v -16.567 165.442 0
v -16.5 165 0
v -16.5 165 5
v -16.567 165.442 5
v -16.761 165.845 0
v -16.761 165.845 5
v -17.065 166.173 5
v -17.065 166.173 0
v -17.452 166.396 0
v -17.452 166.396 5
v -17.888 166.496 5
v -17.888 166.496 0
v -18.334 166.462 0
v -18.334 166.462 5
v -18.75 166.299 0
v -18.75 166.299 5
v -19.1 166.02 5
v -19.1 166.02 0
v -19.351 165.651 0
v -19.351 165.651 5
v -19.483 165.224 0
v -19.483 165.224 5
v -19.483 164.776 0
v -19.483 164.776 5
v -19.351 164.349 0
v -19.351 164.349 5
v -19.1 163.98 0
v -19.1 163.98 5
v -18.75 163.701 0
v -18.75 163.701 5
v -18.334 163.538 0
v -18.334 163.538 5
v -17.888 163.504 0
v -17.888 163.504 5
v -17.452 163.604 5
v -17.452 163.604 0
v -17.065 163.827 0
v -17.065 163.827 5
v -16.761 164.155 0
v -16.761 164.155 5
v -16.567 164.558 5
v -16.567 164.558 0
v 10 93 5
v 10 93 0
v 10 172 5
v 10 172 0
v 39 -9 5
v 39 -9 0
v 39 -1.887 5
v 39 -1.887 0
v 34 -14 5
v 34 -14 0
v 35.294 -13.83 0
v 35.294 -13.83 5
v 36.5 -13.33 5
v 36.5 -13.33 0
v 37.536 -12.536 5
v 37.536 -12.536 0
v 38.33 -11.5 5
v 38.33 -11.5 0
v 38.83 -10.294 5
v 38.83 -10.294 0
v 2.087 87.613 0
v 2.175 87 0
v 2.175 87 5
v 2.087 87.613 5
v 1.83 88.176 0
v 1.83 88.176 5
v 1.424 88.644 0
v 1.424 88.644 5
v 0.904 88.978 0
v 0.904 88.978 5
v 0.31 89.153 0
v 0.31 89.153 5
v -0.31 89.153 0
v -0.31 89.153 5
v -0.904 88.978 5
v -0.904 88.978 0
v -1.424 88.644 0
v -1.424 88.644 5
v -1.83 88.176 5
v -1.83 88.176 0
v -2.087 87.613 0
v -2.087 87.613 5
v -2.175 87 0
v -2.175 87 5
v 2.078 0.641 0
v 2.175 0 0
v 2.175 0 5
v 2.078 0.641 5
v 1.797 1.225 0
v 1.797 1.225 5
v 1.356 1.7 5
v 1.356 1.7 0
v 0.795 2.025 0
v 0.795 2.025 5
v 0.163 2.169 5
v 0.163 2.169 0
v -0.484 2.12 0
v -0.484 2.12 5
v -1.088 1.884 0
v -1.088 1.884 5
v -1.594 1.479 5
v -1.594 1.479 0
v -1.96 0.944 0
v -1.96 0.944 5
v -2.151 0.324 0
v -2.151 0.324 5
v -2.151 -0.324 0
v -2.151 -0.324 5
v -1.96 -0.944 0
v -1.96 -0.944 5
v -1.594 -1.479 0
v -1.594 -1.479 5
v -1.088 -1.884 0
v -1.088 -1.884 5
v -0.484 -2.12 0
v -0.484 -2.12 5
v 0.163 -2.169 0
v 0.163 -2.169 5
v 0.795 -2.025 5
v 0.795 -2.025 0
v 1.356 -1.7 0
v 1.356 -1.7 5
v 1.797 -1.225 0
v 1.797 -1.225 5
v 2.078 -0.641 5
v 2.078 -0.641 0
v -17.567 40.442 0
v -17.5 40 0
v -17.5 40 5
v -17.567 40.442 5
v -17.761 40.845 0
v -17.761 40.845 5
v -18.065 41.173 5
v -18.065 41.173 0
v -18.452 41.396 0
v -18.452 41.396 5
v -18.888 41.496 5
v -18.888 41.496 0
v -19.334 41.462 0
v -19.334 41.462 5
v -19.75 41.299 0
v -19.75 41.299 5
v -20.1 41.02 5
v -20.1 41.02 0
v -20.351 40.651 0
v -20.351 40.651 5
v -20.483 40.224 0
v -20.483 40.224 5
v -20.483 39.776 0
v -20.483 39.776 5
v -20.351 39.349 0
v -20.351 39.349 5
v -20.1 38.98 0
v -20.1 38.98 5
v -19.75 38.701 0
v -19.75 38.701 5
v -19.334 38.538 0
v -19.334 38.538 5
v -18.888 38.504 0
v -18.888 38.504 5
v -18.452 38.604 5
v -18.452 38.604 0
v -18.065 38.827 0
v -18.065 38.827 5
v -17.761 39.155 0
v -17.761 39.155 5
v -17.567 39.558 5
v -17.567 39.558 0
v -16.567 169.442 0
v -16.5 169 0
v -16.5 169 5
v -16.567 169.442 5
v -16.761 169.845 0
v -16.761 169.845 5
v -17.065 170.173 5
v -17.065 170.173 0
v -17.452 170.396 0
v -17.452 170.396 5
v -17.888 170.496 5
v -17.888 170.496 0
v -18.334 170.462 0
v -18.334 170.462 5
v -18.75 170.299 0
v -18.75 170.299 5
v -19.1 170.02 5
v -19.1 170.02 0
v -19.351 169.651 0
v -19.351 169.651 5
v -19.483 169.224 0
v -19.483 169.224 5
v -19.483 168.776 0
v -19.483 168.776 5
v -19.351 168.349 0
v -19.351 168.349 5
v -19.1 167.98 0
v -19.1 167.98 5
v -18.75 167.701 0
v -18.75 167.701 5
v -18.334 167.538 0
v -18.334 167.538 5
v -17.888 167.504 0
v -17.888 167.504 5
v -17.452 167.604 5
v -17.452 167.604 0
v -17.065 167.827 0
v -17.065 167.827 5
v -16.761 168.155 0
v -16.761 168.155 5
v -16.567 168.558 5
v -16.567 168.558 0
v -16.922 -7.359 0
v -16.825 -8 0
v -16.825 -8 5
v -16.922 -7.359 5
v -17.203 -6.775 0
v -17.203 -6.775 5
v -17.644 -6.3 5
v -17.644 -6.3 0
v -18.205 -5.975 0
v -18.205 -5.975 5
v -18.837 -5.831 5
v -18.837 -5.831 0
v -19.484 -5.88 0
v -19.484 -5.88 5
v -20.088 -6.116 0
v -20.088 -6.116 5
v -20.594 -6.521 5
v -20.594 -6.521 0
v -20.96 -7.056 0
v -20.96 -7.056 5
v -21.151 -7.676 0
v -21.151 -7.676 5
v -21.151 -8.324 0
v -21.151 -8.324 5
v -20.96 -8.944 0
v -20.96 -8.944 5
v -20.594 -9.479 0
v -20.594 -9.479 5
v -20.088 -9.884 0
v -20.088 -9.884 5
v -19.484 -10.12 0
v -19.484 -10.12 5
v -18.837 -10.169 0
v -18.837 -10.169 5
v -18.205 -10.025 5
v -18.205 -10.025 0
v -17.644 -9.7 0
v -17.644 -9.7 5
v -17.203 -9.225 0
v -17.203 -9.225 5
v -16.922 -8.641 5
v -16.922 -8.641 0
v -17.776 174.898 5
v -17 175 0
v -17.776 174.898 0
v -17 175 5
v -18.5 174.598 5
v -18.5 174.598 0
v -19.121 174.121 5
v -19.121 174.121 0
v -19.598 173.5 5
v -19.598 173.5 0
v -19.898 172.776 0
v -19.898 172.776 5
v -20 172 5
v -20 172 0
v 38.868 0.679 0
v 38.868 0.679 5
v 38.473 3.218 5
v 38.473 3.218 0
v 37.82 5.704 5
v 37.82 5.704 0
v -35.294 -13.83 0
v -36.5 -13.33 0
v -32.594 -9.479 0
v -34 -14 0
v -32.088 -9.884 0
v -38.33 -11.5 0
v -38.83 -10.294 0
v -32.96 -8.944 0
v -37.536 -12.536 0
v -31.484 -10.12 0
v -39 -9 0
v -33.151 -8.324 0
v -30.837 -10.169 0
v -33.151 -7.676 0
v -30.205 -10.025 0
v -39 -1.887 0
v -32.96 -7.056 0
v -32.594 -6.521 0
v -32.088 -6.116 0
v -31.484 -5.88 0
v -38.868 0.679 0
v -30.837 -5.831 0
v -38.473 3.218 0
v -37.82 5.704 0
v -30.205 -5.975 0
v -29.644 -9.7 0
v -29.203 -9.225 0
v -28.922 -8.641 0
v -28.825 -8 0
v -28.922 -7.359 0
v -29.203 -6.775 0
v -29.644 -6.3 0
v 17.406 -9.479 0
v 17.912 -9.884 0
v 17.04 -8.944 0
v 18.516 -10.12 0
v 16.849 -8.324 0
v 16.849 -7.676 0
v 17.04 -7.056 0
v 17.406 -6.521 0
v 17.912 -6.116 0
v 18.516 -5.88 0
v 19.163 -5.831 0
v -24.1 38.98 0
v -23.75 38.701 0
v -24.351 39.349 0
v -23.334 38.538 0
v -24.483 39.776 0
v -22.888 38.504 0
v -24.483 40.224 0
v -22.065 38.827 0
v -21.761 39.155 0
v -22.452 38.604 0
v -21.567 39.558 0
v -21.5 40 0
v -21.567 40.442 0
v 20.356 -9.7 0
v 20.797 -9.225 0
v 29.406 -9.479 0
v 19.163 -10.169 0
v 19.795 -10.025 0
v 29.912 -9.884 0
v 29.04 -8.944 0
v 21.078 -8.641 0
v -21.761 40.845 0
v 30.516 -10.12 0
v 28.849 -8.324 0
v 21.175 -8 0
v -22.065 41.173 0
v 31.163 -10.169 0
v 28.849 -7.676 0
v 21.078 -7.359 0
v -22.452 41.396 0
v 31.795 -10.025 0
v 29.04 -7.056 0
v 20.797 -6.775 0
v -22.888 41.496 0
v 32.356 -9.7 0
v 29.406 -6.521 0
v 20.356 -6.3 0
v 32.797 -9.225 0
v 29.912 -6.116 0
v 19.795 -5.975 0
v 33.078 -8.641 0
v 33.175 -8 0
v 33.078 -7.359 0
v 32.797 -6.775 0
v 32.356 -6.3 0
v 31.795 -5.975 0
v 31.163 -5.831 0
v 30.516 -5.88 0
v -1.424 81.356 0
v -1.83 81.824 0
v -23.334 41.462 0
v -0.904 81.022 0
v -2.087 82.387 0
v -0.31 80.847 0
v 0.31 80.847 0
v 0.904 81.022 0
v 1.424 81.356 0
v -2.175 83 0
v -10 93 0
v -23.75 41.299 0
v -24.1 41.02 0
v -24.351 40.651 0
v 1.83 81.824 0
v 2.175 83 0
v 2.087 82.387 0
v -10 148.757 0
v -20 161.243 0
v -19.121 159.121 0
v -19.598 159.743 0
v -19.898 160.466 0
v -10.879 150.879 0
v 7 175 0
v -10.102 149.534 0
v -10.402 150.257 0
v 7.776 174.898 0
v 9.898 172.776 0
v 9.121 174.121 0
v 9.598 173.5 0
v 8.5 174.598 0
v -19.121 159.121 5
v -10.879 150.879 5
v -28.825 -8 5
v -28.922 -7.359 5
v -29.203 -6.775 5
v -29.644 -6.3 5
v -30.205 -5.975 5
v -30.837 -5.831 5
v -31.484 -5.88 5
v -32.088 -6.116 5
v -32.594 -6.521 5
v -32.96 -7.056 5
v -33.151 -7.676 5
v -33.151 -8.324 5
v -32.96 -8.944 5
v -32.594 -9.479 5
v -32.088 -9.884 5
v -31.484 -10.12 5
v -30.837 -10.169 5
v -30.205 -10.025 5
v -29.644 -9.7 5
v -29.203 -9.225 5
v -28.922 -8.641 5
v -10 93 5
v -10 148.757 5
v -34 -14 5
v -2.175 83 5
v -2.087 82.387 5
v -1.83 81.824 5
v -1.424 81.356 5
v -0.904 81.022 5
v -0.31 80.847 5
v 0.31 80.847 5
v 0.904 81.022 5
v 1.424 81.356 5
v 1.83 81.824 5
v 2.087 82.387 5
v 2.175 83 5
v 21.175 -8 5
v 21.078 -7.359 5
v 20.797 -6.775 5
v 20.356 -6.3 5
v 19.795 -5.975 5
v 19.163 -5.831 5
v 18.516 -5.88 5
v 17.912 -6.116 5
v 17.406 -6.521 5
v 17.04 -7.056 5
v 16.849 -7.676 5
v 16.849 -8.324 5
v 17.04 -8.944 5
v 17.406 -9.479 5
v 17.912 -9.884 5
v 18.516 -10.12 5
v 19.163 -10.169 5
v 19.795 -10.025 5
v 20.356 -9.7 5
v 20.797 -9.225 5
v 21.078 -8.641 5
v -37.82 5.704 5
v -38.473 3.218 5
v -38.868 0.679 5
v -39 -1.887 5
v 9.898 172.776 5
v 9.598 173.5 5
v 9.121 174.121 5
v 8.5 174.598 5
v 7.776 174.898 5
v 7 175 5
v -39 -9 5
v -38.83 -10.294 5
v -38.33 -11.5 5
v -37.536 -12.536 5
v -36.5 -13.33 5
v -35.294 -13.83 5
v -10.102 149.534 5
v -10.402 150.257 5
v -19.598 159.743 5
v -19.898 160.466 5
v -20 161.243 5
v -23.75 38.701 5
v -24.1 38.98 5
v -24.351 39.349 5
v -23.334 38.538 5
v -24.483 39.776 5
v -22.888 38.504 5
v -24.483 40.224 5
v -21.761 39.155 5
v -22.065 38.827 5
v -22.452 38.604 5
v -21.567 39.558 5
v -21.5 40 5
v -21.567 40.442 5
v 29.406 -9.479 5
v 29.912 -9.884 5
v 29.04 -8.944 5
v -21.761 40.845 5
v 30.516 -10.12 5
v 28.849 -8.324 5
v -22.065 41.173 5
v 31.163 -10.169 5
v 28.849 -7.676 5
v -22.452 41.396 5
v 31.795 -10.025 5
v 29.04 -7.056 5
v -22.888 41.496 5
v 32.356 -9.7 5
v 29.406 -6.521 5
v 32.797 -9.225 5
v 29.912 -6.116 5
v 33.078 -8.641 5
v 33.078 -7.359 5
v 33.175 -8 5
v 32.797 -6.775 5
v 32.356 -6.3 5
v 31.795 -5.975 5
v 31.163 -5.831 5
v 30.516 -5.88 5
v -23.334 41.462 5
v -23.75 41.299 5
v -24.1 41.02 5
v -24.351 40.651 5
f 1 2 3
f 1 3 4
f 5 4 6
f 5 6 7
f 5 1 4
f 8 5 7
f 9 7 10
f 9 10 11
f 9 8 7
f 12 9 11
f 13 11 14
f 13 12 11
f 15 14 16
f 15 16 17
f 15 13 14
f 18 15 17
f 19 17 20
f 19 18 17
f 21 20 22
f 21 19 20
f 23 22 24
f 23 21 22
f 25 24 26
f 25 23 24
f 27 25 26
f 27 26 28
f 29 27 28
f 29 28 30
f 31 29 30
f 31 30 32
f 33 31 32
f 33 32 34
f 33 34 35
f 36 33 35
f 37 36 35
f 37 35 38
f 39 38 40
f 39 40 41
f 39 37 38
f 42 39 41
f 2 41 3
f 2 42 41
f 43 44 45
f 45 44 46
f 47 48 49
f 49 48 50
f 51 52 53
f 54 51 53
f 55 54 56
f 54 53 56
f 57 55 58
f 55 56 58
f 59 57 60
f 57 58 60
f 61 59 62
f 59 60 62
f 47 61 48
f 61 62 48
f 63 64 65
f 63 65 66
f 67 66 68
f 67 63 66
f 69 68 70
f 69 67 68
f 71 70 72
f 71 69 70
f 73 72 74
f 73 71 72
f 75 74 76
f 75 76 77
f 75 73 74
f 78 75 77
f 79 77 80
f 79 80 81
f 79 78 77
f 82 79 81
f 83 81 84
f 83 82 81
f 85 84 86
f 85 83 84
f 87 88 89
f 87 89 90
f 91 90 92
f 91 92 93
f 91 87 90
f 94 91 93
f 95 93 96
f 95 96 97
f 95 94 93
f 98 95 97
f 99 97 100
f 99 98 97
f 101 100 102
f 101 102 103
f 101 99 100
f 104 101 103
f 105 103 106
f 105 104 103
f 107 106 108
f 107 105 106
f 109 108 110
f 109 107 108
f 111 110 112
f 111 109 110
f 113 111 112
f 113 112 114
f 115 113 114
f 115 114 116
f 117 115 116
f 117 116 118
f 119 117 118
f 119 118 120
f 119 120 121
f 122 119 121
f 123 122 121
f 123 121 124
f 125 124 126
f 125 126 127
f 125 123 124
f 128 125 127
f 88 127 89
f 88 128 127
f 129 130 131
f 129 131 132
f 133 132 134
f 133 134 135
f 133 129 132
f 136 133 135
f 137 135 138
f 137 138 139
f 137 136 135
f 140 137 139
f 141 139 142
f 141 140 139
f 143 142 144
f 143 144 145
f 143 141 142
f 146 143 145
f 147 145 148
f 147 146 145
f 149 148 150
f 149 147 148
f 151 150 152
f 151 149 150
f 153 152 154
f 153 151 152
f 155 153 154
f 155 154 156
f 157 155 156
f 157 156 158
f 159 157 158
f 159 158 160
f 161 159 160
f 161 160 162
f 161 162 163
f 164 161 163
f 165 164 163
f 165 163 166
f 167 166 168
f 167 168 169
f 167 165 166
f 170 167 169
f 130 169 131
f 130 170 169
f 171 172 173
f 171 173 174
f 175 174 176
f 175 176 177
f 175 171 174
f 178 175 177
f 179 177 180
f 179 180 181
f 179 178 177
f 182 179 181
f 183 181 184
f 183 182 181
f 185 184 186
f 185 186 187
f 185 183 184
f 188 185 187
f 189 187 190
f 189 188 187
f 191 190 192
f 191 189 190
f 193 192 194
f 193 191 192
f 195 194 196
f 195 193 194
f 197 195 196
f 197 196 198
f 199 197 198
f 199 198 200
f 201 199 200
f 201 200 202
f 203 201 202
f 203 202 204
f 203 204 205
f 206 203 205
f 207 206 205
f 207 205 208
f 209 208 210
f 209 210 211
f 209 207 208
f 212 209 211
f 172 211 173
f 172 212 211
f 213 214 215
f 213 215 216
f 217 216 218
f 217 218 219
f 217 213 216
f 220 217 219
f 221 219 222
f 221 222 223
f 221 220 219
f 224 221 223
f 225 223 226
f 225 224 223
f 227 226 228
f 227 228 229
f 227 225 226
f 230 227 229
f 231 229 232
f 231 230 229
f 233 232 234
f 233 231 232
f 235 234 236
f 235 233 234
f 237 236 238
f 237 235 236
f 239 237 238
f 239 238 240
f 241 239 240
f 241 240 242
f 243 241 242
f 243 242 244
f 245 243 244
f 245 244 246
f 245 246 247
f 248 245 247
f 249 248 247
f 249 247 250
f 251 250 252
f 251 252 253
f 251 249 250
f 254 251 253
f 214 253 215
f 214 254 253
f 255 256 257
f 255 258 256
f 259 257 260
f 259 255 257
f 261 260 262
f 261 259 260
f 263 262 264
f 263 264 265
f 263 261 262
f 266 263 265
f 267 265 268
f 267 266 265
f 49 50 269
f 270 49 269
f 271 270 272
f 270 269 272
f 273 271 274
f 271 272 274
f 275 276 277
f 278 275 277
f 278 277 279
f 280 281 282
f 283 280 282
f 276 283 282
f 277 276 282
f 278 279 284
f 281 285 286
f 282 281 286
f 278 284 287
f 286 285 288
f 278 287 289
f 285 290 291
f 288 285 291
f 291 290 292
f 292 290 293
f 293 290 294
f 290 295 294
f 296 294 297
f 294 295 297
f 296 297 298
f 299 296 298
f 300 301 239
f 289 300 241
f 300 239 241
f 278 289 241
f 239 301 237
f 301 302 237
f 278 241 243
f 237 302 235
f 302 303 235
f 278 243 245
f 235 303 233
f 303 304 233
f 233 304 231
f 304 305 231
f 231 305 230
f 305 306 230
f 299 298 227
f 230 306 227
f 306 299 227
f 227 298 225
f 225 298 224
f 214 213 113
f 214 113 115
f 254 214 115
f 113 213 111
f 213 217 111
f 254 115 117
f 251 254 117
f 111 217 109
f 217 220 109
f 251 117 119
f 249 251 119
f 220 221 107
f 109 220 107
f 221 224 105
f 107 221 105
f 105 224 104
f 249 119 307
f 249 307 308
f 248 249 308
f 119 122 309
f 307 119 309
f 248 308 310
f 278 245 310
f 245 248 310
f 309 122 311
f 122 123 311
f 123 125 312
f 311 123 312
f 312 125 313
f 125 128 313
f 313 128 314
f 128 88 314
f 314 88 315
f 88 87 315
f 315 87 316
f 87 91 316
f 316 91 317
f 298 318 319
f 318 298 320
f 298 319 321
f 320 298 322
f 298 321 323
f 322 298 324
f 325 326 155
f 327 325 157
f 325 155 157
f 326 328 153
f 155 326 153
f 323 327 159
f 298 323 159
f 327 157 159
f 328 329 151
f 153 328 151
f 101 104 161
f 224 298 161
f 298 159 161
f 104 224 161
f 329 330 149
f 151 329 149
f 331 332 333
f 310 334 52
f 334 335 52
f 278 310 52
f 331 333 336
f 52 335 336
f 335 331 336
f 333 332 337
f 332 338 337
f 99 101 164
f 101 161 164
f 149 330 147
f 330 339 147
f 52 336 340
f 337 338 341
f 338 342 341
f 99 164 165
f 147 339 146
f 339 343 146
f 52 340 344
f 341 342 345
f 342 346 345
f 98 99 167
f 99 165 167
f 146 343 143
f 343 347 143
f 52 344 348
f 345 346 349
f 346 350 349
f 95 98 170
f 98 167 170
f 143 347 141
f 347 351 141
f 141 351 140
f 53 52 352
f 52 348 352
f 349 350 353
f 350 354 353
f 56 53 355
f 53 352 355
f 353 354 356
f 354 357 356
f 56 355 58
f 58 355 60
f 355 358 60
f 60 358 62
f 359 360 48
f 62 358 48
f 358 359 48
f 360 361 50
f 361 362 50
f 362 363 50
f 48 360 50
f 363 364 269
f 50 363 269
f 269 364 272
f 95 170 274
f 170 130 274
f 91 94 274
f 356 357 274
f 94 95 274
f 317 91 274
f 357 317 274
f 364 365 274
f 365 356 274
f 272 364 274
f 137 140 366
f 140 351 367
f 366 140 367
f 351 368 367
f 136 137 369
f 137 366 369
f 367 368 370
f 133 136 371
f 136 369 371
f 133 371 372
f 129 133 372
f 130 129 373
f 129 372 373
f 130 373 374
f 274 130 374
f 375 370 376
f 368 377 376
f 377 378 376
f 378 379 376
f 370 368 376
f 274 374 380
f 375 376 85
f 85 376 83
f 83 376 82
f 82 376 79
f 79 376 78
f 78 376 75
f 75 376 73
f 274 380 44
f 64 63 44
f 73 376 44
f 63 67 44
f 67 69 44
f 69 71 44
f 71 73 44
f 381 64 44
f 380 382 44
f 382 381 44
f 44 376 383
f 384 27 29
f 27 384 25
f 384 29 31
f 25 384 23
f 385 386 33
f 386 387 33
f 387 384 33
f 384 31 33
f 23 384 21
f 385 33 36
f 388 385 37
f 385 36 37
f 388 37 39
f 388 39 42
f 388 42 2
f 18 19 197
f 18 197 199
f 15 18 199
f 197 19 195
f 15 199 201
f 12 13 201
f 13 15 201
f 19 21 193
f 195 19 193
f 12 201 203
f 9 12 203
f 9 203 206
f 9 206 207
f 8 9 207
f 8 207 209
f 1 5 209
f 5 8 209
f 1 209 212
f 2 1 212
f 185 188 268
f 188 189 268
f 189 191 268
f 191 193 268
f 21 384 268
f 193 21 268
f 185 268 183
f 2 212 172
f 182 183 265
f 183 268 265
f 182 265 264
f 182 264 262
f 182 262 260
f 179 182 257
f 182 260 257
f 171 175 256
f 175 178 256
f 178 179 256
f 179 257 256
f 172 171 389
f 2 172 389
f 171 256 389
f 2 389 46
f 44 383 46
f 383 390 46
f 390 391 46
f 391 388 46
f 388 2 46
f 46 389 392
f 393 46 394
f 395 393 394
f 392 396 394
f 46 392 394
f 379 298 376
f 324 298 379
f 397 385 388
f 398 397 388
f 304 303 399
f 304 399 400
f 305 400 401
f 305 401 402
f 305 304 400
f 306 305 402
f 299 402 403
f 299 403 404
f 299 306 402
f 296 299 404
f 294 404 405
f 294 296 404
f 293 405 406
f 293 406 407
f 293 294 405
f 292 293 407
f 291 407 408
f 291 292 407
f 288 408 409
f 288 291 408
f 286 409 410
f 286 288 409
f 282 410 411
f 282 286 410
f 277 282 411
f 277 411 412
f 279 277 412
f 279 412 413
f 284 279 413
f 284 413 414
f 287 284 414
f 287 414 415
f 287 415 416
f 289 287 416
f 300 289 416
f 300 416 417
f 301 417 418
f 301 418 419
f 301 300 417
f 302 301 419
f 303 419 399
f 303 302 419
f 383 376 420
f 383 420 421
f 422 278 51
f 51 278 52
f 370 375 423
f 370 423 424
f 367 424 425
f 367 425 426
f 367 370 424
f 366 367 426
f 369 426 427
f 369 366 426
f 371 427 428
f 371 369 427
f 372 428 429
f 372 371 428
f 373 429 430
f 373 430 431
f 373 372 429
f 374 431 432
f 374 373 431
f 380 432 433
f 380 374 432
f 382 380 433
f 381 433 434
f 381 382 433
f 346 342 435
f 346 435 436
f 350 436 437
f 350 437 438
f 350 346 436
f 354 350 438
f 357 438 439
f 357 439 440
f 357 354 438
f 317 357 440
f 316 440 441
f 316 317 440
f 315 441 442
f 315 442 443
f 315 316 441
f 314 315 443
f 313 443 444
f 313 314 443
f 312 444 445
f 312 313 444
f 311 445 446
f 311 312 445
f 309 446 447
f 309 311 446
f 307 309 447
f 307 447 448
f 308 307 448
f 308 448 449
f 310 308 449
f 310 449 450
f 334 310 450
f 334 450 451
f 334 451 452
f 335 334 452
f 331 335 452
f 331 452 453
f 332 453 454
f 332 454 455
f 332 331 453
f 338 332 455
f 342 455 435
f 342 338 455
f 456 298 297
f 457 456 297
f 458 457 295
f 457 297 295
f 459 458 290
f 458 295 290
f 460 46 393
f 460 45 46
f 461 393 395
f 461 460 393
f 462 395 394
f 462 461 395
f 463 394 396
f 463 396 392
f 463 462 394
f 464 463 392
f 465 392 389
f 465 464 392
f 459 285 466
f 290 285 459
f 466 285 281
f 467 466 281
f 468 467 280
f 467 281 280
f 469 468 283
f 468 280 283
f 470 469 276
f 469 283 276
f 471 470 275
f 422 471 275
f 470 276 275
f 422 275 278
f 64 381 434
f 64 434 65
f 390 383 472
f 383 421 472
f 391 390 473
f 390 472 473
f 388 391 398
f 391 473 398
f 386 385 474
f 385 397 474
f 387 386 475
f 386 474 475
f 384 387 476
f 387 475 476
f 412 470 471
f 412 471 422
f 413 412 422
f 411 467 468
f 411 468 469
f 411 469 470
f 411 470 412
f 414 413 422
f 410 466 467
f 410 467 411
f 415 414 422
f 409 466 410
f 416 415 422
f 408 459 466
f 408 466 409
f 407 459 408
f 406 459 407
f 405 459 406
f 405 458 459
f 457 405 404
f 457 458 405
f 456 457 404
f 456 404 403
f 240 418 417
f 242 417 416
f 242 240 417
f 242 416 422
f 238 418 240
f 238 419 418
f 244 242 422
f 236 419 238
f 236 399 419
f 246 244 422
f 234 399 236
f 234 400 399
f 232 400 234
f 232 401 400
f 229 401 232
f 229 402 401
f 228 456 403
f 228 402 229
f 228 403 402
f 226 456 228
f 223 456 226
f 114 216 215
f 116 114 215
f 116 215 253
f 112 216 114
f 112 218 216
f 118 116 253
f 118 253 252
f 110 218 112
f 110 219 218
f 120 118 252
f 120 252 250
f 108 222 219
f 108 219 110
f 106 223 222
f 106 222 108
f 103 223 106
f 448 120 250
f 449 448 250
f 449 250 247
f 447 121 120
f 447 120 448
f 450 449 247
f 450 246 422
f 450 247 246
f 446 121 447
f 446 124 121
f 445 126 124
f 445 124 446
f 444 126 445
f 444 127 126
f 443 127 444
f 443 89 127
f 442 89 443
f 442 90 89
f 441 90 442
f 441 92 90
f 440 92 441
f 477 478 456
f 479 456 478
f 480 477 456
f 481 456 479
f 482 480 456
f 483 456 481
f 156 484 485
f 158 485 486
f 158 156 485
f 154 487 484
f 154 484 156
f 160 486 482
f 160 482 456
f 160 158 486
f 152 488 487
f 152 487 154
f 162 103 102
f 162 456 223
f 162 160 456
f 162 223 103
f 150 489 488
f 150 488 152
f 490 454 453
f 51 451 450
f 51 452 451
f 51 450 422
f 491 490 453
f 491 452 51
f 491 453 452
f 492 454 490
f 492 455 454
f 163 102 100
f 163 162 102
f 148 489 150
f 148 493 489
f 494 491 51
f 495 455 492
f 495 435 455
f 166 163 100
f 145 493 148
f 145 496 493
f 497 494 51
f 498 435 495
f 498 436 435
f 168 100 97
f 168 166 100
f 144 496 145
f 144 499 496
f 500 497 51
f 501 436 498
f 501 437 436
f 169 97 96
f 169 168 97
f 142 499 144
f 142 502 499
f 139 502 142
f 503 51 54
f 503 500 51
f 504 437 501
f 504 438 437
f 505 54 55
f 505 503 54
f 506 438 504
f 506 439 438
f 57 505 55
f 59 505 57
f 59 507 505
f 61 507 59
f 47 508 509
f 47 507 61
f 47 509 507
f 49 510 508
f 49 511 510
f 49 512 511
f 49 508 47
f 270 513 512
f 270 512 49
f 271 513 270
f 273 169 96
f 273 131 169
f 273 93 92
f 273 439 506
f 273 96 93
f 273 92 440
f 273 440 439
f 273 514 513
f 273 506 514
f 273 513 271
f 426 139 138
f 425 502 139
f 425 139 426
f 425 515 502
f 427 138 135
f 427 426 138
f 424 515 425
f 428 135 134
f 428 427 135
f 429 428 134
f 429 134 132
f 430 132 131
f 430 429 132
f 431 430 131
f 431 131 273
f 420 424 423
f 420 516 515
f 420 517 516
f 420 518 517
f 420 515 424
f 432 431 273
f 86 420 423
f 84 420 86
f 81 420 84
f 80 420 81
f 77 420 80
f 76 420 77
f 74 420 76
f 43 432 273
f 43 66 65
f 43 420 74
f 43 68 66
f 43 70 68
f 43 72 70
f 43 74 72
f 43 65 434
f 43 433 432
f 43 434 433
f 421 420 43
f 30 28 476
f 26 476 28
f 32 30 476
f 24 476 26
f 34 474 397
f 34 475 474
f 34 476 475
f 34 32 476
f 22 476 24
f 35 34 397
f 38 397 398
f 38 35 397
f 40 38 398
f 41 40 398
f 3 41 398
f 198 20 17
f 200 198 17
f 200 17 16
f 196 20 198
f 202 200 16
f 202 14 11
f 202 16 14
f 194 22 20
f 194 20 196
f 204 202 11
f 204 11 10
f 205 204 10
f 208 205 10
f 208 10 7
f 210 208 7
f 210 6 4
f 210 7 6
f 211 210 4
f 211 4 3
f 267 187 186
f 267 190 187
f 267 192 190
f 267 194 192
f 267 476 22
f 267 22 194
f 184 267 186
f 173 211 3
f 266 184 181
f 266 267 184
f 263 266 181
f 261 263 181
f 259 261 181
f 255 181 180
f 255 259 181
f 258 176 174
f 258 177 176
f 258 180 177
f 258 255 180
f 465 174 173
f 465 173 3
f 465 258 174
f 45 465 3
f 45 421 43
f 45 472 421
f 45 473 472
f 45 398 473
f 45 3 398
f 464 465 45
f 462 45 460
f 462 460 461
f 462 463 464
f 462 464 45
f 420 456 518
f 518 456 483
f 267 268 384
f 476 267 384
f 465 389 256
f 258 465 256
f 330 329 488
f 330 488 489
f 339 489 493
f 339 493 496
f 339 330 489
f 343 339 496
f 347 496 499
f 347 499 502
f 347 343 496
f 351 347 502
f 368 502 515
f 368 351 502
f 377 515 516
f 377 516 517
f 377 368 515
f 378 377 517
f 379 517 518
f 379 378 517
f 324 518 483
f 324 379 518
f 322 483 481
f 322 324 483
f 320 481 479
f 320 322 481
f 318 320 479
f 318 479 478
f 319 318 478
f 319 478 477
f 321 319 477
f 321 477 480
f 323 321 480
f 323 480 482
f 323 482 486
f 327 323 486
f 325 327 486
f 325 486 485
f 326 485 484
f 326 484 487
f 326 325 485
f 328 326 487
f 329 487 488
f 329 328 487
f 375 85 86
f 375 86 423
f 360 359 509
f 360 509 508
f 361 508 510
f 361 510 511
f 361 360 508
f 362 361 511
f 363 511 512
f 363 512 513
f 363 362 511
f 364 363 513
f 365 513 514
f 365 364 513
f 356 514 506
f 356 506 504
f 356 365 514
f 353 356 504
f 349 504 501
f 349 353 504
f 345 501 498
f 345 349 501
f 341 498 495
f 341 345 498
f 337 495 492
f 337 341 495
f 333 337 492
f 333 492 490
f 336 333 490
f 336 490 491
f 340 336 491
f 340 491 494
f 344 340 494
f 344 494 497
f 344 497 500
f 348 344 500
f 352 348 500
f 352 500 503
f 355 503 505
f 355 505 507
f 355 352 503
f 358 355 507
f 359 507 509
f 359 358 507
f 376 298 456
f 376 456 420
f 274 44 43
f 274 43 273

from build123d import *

# Parameters (mm, degrees)
SKETCH_R   = 2.175
SKETCH_R_2 = 1.5
PAD_DEPTH  = 5
FILLET_R   = 3


with BuildPart() as part:
    # Sketch → Pad (new body)
    with BuildSketch(Plane.XY):
        with BuildLine():
            Line((-34, -14), (34, -14))
            ThreePointArc((34, -14), (37.535534, -12.535534), (39, -9))
            Line((39, -9), (39, -1.887209))
            ThreePointArc((39, -1.887209), (38.703164, 1.953845), (37.819704, 5.703686))
            Line((10, 93), (37.819704, 5.703686))
            Line((10, 93), (10, 175))
            Line((-10, 175), (10, 175))
            Line((-10, 175), (-20, 175))
            Line((-20, 175), (-20, 160))
            Line((-20, 160), (-10, 150))
            Line((-10, 93), (-10, 150))
            Line((-37.819704, 5.703686), (-10, 93))
            ThreePointArc((-37.819704, 5.703686), (-38.703164, 1.953845), (-39, -1.887209))
            Line((-39, -9), (-39, -1.887209))
            ThreePointArc((-39, -9), (-37.535534, -12.535534), (-34, -14))
        make_face()
        Circle(SKETCH_R, mode=Mode.SUBTRACT)
        with Locations((19, -8)):
            Circle(SKETCH_R, mode=Mode.SUBTRACT)
        with Locations((31, -8)):
            Circle(SKETCH_R, mode=Mode.SUBTRACT)
        with Locations((-19, -8)):
            Circle(SKETCH_R, mode=Mode.SUBTRACT)
        with Locations((-31, -8)):
            Circle(SKETCH_R, mode=Mode.SUBTRACT)
        with Locations((-19, 40)):
            Circle(SKETCH_R_2, mode=Mode.SUBTRACT)
        with Locations((-23, 40)):
            Circle(SKETCH_R_2, mode=Mode.SUBTRACT)
        with Locations((-18, 165)):
            Circle(SKETCH_R_2, mode=Mode.SUBTRACT)
        with Locations((-18, 169)):
            Circle(SKETCH_R_2, mode=Mode.SUBTRACT)
        with BuildLine():
            ThreePointArc((2.175, 87), (0, 89.175), (-2.175, 87))
            Line((-2.175, 87), (-2.175, 83))
            ThreePointArc((-2.175, 83), (1e-06, 80.825), (2.175, 83.000002))
            Line((2.175, 83.000002), (2.175, 87))
        make_face(mode=Mode.SUBTRACT)
    extrude(amount=PAD_DEPTH)

    # Fillet
    fillet_edges = [part.edges().sort_by_distance(p)[0] for p in [
        (-20, 175, 2.5),
        (10, 175, 2.5),
        (-10, 150, 2.5),
        (-20, 160, 2.5),
    ]]
    fillet(fillet_edges, radius=FILLET_R)


solid = part.part
